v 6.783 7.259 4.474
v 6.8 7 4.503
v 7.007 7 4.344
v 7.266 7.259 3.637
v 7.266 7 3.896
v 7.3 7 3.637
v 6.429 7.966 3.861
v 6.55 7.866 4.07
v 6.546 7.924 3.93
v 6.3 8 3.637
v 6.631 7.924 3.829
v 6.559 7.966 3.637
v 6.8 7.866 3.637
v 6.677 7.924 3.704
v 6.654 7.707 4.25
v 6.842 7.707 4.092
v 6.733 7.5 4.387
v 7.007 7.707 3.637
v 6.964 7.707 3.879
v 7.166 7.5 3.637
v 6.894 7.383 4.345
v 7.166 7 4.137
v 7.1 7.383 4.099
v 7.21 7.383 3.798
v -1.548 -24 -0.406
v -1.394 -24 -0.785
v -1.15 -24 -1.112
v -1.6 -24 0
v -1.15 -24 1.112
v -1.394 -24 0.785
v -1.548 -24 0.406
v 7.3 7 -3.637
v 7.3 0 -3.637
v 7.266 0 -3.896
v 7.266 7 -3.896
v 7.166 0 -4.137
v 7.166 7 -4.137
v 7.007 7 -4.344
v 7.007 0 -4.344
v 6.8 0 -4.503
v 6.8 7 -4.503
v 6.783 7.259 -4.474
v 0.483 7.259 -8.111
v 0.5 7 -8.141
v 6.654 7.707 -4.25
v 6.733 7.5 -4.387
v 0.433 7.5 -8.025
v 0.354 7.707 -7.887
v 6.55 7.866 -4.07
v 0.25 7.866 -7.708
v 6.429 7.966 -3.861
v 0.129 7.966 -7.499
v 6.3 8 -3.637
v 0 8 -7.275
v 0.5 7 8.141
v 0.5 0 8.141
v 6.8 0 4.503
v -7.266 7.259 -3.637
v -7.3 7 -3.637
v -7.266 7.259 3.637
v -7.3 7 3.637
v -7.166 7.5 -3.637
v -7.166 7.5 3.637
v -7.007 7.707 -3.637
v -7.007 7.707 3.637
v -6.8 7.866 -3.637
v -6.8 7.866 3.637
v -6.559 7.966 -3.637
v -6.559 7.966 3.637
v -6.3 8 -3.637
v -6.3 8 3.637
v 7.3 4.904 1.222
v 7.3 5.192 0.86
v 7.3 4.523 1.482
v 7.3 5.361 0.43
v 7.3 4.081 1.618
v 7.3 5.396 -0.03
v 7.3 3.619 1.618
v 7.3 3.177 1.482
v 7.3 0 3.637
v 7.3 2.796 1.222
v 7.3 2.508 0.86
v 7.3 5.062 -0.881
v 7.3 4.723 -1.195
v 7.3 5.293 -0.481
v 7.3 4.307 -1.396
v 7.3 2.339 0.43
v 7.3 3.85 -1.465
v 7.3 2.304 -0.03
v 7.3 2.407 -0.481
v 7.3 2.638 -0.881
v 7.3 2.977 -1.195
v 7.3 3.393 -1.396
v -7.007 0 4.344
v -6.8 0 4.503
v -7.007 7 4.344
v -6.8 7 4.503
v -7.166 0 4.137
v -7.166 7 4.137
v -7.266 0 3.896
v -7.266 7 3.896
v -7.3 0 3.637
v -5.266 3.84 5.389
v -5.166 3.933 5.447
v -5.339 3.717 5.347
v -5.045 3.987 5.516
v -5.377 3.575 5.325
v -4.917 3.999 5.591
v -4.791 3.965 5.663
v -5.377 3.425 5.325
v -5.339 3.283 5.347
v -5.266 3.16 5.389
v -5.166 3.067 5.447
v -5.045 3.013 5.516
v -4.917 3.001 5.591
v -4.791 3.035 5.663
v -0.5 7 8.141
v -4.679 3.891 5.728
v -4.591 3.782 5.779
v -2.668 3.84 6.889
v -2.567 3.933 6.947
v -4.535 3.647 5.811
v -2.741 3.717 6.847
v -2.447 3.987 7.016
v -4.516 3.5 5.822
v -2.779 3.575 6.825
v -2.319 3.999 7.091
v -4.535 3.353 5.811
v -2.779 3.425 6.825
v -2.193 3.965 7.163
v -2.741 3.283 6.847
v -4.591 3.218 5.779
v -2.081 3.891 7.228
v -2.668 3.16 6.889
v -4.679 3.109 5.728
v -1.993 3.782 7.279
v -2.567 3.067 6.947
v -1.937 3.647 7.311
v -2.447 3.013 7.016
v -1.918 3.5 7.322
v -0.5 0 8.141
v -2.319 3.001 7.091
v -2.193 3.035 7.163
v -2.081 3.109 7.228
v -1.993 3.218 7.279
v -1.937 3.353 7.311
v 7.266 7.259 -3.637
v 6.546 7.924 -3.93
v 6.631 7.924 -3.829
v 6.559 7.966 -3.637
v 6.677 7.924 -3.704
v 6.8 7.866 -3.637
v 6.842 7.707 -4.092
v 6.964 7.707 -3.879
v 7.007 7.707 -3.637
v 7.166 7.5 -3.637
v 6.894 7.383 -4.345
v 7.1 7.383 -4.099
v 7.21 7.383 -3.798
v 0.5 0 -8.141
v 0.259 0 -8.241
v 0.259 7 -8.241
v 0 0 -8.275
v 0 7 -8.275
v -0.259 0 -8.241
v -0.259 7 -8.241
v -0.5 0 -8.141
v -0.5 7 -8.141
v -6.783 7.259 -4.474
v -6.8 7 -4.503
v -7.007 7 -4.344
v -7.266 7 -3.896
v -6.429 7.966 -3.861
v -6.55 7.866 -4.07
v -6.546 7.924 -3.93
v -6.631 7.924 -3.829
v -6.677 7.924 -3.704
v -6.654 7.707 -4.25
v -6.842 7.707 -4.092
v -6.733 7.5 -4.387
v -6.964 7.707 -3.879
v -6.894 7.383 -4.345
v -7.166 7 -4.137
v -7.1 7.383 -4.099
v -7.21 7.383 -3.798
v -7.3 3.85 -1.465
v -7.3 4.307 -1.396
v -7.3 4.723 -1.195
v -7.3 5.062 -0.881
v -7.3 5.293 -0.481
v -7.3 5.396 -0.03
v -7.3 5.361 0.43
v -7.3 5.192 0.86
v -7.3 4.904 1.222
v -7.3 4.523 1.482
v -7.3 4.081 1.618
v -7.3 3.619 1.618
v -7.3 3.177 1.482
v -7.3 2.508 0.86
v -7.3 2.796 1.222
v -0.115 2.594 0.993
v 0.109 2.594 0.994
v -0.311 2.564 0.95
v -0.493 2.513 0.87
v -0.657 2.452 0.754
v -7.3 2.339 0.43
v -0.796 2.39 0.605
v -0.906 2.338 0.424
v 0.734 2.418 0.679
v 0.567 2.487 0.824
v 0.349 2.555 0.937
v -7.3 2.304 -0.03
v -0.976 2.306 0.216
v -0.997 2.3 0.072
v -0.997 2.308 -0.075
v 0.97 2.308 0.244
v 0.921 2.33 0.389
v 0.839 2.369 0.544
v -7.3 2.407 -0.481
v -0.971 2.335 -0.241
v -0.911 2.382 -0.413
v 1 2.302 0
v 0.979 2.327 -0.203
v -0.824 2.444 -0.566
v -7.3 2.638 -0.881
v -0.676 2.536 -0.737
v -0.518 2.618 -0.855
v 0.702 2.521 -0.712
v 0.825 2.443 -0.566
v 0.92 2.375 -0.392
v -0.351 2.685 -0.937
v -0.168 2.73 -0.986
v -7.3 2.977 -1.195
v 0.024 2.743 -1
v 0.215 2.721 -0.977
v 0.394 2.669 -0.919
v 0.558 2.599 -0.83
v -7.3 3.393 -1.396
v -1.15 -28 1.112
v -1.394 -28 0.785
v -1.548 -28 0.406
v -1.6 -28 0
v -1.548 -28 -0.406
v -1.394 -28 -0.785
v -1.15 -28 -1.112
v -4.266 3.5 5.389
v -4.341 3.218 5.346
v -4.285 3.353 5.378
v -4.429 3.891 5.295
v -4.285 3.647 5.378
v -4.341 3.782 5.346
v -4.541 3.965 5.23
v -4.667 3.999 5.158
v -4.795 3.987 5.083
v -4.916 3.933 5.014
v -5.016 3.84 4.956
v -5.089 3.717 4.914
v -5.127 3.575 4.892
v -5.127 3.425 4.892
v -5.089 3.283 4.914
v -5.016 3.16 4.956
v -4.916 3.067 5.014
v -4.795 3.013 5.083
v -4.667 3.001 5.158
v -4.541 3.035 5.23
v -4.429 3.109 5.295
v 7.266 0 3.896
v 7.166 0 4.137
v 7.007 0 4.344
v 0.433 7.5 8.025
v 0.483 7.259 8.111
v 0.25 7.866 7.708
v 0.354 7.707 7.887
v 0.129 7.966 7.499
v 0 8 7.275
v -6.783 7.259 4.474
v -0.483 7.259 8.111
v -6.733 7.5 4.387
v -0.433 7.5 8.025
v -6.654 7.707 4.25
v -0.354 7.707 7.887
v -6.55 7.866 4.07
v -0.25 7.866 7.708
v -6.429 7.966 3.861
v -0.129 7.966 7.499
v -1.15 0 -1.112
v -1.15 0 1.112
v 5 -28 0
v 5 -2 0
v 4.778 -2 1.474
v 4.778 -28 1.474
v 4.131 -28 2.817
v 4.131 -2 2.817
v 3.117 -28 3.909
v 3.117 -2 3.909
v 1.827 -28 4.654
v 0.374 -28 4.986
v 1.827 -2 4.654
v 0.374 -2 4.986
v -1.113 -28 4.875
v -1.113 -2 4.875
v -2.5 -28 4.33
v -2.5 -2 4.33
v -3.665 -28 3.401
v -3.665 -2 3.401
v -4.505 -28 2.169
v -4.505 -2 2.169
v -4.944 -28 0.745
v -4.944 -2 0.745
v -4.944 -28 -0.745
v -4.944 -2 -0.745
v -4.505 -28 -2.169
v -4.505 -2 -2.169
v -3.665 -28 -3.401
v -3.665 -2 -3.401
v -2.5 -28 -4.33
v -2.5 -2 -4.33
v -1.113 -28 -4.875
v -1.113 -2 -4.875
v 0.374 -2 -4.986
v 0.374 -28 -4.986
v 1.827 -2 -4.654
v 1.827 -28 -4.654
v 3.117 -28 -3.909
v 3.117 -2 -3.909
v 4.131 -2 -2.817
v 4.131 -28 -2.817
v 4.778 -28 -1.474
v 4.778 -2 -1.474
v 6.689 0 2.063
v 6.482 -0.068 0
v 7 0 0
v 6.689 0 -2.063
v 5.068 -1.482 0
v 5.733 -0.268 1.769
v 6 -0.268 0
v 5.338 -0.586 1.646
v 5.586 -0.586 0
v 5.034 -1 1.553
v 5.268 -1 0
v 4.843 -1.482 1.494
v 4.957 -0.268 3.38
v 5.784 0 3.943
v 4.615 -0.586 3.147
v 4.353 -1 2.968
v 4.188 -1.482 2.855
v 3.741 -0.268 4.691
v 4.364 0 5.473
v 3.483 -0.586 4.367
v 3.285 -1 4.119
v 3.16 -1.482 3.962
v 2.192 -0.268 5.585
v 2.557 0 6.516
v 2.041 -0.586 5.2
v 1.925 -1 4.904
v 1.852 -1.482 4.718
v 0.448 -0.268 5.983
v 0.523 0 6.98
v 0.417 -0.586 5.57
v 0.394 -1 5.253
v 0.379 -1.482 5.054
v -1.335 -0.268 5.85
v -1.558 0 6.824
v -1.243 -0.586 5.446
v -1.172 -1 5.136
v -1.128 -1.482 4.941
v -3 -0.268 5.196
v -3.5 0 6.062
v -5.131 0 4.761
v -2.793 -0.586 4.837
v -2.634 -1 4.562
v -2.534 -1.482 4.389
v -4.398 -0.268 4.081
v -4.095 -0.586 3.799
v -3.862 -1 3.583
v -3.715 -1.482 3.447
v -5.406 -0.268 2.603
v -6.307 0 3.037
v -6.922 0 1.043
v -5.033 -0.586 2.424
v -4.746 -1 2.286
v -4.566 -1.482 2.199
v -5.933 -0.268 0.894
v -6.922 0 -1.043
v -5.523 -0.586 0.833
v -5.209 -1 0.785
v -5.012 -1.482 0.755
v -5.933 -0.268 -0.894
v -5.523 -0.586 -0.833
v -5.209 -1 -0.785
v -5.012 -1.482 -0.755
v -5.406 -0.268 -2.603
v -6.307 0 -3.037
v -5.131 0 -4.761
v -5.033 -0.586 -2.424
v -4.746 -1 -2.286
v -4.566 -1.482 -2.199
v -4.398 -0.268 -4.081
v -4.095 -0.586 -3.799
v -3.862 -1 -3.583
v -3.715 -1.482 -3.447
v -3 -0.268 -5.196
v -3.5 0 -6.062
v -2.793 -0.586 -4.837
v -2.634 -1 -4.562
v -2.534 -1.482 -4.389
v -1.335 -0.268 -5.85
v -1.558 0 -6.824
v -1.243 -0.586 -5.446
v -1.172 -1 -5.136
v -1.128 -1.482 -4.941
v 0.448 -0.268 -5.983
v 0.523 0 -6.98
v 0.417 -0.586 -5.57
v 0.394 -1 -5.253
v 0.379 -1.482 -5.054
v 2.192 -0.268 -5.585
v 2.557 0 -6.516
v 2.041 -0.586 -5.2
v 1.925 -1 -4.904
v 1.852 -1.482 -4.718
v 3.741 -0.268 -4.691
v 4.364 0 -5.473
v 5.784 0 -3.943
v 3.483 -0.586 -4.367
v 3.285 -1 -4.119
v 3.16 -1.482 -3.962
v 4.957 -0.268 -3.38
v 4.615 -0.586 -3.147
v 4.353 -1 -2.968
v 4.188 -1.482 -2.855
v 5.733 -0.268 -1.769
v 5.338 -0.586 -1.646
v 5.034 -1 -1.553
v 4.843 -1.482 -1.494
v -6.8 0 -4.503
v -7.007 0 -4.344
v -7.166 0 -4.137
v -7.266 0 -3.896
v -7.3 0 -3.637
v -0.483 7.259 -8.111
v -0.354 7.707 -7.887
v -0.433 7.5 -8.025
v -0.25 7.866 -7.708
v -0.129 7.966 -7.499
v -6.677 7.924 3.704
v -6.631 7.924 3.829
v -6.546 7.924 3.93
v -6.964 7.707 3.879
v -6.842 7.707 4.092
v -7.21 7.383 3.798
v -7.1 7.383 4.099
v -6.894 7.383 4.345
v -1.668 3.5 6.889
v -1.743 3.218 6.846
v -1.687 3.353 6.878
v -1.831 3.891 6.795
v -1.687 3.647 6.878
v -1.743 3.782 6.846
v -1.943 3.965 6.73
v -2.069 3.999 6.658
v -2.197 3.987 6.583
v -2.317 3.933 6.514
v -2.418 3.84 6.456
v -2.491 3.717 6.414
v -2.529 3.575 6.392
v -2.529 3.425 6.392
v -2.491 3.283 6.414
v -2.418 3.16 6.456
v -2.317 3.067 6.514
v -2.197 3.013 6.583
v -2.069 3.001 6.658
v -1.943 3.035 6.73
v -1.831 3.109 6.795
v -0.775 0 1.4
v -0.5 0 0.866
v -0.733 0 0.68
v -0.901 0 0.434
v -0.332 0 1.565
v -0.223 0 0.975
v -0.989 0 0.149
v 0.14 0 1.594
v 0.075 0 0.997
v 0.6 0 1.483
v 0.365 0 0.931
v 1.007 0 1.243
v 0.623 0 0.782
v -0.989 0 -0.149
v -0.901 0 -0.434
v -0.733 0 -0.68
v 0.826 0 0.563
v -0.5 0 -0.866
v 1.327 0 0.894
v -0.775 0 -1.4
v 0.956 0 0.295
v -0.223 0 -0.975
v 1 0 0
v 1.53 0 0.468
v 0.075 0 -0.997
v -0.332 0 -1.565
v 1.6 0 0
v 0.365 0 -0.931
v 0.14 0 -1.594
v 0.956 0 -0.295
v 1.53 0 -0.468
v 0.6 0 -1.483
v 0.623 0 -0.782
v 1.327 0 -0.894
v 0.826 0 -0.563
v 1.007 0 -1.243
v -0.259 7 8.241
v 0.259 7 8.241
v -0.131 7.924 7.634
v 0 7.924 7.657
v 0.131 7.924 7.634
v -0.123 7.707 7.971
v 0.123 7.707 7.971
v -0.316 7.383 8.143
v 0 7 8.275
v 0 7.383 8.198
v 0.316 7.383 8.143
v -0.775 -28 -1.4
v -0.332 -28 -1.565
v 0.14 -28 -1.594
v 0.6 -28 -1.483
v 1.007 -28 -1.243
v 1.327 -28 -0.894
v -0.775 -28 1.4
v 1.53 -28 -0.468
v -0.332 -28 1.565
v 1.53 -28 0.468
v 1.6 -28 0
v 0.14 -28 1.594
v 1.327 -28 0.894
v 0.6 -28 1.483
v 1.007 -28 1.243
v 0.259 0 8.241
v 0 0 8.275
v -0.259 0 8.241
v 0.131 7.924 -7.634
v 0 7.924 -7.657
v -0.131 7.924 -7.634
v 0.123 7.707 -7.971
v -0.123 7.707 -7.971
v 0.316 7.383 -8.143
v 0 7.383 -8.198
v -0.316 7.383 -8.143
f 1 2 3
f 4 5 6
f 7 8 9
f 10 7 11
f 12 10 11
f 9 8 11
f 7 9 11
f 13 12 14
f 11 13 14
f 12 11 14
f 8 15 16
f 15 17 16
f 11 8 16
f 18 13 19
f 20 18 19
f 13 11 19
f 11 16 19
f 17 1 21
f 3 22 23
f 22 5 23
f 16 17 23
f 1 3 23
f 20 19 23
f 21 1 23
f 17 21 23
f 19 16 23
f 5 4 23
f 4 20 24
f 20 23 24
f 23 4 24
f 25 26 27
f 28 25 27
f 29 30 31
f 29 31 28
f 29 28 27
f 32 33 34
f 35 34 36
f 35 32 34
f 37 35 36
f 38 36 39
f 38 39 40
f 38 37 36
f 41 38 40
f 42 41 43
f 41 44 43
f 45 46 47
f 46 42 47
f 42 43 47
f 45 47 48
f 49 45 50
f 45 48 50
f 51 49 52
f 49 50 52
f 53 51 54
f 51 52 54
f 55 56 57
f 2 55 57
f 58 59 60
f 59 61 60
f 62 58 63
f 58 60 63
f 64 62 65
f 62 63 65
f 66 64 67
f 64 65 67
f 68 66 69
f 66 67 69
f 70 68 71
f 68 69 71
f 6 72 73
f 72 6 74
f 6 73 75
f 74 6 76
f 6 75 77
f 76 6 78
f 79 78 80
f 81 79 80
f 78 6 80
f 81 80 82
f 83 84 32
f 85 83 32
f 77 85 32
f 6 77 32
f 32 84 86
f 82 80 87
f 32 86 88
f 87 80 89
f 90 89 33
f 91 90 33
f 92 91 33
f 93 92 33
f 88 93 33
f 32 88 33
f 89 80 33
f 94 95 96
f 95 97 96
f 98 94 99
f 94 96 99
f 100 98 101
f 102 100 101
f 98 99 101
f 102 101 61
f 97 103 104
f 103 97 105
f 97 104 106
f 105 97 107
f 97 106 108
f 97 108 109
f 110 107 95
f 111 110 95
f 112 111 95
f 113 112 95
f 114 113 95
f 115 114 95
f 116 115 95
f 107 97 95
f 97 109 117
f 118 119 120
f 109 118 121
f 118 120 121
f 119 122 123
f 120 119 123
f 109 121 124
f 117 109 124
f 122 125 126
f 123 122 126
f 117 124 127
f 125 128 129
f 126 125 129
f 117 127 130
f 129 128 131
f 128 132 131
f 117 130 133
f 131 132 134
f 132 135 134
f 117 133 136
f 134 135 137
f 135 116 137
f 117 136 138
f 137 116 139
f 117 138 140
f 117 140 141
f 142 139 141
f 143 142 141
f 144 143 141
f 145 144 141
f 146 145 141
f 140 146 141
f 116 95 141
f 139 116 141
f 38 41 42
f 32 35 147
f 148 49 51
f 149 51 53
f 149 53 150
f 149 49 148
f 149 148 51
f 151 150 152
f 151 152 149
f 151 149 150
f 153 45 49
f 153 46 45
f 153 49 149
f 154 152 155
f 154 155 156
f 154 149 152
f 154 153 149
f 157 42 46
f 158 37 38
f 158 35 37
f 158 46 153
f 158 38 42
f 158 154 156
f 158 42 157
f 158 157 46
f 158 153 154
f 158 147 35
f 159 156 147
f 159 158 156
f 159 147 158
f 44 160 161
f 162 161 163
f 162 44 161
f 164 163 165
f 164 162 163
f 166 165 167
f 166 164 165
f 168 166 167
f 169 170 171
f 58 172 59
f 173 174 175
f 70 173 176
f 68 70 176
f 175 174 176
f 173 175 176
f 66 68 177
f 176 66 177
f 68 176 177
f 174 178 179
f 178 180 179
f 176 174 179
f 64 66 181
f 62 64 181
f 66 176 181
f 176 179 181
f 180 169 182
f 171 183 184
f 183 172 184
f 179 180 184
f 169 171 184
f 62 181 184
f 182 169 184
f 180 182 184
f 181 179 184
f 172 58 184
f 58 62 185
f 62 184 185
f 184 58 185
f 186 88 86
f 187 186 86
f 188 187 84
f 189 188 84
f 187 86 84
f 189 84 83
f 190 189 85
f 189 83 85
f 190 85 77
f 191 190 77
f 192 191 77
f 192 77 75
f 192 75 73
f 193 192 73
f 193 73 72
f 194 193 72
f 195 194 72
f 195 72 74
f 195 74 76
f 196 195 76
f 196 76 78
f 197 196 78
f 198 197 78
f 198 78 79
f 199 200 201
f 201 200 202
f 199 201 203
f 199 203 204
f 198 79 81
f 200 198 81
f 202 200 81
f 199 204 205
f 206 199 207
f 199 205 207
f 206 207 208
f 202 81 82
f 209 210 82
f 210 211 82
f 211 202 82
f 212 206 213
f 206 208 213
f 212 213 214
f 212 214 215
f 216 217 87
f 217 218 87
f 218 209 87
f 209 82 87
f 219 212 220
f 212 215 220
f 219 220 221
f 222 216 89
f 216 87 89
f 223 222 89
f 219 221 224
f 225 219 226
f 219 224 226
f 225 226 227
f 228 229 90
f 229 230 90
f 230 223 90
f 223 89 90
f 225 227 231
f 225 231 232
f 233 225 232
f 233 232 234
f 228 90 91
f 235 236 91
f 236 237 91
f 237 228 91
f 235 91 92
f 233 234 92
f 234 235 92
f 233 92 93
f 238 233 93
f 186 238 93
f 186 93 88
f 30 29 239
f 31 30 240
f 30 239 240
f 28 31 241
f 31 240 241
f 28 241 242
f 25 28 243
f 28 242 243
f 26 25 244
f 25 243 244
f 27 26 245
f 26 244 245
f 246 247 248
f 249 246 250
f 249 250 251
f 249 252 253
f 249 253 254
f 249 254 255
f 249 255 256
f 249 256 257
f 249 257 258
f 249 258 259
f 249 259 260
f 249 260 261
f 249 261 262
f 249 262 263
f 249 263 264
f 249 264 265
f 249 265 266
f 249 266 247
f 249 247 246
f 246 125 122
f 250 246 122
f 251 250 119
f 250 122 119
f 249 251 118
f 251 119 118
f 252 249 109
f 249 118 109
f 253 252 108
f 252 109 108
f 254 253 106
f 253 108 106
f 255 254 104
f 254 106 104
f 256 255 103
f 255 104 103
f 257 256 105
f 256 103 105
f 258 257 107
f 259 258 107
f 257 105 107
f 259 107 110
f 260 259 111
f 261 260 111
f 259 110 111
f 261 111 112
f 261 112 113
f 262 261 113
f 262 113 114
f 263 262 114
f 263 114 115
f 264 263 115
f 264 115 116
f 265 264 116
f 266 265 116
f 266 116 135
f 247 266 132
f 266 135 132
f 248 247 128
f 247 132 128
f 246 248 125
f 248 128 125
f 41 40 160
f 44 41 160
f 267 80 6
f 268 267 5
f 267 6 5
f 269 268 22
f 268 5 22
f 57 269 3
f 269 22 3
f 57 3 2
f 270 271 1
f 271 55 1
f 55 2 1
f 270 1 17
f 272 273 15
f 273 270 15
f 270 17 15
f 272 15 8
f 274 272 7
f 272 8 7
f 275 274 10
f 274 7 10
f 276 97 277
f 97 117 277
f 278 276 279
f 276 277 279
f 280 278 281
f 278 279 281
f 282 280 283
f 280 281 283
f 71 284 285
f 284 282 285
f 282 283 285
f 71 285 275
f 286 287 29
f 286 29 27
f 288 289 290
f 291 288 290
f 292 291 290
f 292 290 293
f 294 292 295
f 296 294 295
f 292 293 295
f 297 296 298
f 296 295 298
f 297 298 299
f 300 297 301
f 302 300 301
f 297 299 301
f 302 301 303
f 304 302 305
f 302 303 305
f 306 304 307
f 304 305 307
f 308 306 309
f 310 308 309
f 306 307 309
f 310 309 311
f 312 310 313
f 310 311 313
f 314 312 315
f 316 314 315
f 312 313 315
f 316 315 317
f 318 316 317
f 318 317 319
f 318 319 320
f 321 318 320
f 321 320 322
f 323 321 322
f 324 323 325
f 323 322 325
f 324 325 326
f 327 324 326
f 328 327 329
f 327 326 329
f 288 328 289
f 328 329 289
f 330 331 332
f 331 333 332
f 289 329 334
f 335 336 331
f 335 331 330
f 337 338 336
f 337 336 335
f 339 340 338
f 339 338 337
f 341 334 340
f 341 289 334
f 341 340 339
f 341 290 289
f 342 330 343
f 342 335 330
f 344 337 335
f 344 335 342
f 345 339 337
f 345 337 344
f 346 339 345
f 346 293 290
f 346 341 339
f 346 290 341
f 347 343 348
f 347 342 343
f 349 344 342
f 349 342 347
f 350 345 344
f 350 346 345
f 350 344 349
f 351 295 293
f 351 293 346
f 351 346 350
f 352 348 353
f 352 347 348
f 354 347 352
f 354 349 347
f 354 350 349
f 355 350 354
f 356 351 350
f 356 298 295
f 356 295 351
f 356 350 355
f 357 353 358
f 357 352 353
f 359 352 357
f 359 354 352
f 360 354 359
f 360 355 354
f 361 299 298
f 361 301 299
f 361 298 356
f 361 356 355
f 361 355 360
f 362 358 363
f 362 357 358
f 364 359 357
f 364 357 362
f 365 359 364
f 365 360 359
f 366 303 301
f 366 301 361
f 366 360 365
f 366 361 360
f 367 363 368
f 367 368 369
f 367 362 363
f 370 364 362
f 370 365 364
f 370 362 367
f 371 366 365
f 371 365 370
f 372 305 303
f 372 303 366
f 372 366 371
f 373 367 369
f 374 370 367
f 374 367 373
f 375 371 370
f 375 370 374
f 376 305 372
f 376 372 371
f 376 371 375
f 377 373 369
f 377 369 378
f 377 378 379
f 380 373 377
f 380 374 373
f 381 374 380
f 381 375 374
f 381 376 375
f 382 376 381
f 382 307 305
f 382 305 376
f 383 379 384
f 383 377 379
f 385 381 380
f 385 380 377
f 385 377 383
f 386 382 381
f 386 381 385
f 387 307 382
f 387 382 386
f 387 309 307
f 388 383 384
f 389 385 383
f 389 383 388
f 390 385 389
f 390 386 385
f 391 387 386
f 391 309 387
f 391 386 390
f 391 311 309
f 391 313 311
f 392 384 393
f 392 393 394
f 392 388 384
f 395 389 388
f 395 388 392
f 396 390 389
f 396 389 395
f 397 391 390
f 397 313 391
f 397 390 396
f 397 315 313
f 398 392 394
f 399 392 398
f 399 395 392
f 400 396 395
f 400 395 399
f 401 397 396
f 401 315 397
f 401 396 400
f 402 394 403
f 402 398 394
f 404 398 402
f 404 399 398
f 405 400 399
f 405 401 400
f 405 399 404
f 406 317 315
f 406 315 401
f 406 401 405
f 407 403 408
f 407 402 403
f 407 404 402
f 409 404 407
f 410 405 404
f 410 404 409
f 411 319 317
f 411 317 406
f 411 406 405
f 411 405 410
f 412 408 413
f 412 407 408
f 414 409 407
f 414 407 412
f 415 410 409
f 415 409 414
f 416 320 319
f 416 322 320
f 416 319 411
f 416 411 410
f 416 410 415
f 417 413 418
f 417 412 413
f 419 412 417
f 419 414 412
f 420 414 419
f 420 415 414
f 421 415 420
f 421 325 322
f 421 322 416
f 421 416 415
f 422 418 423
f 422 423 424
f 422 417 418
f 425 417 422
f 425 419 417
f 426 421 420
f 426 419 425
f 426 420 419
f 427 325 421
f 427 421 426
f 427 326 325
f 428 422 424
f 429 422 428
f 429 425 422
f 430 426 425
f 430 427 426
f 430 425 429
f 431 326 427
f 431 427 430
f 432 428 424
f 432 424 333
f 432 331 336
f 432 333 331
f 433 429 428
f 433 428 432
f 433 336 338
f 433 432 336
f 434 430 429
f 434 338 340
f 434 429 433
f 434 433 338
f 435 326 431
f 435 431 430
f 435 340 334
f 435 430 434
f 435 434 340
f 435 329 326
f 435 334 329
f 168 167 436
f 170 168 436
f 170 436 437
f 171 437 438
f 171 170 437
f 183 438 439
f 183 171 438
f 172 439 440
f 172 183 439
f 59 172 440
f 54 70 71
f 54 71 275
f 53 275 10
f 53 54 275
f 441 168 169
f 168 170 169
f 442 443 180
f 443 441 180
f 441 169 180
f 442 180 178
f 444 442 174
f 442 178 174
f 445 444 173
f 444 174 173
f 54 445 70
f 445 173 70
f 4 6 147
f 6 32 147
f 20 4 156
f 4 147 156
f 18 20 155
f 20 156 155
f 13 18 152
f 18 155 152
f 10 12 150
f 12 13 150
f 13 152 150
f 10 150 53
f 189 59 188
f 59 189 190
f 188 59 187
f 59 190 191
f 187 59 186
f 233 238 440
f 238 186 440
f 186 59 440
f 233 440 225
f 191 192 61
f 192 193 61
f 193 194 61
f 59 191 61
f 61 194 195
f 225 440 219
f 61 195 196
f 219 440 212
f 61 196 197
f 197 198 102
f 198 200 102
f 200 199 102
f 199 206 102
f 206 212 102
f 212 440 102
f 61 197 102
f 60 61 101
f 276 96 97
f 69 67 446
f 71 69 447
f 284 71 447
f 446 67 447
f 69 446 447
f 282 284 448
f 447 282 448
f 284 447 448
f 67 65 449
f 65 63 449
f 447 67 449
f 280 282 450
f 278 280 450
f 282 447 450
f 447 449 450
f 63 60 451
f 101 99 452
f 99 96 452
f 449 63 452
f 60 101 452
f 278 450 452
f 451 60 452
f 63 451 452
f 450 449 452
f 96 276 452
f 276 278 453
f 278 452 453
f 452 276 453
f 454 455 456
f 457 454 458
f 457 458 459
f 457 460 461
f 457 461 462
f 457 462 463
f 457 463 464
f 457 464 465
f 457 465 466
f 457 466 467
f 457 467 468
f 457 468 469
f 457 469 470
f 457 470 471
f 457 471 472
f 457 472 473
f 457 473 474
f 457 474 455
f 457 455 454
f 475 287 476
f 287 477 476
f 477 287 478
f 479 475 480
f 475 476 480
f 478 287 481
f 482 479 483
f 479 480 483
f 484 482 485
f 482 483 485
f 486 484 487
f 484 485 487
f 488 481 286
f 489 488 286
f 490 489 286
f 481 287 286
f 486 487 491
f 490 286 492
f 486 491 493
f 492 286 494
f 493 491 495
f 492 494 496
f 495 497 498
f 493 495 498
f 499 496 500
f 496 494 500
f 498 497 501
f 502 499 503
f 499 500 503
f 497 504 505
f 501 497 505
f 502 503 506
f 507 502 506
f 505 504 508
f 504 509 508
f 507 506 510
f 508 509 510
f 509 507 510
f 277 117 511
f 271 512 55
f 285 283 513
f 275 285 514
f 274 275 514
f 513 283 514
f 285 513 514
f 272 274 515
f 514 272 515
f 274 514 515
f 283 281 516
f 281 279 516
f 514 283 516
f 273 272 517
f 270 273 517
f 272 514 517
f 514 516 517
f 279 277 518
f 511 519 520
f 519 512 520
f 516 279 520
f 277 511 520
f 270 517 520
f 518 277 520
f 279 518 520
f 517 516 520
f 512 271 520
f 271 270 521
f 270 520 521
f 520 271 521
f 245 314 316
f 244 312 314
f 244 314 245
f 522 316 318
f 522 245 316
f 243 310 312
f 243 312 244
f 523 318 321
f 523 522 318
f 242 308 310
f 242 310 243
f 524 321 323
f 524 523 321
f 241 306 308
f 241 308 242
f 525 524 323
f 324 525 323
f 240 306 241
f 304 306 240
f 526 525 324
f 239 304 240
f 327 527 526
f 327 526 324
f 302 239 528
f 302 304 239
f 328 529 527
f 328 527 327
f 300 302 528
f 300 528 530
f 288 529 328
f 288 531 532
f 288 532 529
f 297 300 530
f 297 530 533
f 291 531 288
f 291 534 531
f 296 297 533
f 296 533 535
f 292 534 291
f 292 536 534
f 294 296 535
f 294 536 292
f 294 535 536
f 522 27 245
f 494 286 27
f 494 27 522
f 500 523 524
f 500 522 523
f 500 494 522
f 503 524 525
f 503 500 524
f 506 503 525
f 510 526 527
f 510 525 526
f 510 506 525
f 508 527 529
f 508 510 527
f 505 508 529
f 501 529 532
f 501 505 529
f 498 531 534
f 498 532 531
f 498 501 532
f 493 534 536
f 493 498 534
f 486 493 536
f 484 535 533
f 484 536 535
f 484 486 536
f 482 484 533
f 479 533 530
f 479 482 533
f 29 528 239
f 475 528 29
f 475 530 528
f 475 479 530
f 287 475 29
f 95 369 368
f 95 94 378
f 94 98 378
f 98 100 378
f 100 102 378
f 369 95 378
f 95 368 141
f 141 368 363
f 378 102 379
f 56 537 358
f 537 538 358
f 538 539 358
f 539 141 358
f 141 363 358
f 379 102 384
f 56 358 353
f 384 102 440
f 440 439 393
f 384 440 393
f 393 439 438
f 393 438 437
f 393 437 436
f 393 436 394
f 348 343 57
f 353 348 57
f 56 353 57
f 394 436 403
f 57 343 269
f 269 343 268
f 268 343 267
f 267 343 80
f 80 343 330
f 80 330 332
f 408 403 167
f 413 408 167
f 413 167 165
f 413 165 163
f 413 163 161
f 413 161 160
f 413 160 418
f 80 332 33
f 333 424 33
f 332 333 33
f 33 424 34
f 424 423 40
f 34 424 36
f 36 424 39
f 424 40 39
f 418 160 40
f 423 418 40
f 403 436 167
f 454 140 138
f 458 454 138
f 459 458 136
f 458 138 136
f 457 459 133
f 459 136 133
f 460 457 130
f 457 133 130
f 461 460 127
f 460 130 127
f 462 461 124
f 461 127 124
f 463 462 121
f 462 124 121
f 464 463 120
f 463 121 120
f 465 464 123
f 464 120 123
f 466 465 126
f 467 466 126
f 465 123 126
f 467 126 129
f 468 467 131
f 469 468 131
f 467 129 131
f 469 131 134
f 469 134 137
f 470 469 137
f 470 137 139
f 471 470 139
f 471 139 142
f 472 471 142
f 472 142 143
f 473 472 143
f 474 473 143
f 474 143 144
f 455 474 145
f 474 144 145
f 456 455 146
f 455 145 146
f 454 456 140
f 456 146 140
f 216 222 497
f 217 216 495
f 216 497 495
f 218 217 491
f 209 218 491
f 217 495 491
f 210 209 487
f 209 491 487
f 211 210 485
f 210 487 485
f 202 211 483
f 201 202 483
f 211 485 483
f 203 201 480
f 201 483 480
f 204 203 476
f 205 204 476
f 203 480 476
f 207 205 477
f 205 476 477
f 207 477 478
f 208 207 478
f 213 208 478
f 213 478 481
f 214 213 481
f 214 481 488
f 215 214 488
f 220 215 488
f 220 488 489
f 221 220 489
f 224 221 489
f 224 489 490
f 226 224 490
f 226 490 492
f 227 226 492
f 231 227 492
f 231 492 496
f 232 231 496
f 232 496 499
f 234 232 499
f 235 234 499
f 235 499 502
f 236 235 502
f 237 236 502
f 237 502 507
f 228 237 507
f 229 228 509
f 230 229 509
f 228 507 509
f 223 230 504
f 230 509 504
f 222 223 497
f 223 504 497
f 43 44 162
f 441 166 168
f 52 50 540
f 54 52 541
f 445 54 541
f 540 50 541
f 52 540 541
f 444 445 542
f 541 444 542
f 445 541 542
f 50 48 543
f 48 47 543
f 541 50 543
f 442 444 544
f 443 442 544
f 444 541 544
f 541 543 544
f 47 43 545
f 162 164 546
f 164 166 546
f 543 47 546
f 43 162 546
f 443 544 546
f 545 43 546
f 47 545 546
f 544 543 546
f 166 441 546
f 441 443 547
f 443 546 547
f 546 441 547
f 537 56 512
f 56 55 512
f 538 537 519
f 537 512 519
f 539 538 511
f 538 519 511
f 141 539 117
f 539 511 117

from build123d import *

# Parameters (mm, degrees)
BOSS_EXTRUDE1_DEPTH     = 8
SKETCH2_R               = 5
BOSS_EXTRUDE2_DEPTH     = 28
FILLET1_R               = 2
SKETCH3_R               = 1.55
CUT_EXTRUDE1_DEPTH      = 33.683533061
FILLET2_R               = 1
CUT_EXTRUDE3_START      = -4
SKETCH5_R               = 1.6
CUT_EXTRUDE3_DEPTH      = 4
SKETCH6_R               = 0.5
CUT_EXTRUDE4_DEPTH      = 0.5
CUT_EXTRUDE5_REACH      = 32.096
CUT_EXTRUDE5_END_RADIUS = 1.55
SKETCH7_R               = 1


with BuildPart() as part:
    # Sketch1 → Boss-Extrude1 (new body)
    with BuildSketch(Plane(origin=(0, 0, 0), x_dir=(1, 0, 0), z_dir=(0, 1, 0))):
        Polygon((7.3, -4.214656965), (7.3, 4.214656965), (0, 8.42931393), (-7.3, 4.214656965), (-7.3, -4.214656965), (0, -8.42931393), align=None)
    extrude(amount=BOSS_EXTRUDE1_DEPTH)

    # Sketch2 → Boss-Extrude2 (add)
    with BuildSketch(Plane.XZ):
        Circle(SKETCH2_R)
        with BuildLine():
            Line((-1.15, 1.112429773), (-1.15, -1.112429773))
            ThreePointArc((-1.15, -1.112429773), (1.6, 0), (-1.15, 1.112429773))
        make_face(mode=Mode.SUBTRACT)
    extrude(amount=BOSS_EXTRUDE2_DEPTH)

    # Fillet1
    fillet1_edges = [part.edges().sort_by_distance(p)[0] for p in [
        (-5, 0, 0),
    ]]
    fillet(fillet1_edges, radius=FILLET1_R)

    # Sketch3 → Cut-Extrude1 (cut, through all)
    with BuildSketch(Plane(origin=(7.3, 0, 0), x_dir=(0, 0, -1), z_dir=(1, 0, 0))):
        with Locations((-0.085343035, 3.85)):
            Circle(SKETCH3_R)
    extrude(amount=-CUT_EXTRUDE1_DEPTH, mode=Mode.SUBTRACT)

    # Fillet2
    fillet2_edges = [part.edges().sort_by_distance(p)[0] for p in [
        (-3.65, 8, 6.321985448),
        (-7.3, 8, 0),
        (-3.65, 8, -6.321985448),
        (3.65, 8, -6.321985448),
        (7.3, 8, 0),
        (3.65, 8, 6.321985448),
        (-7.3, 4, -4.214656965),
        (0, 4, -8.42931393),
        (7.3, 4, -4.214656965),
        (7.3, 4, 4.214656965),
        (0, 4, 8.42931393),
        (-7.3, 4, 4.214656965),
    ]]
    fillet(fillet2_edges, radius=FILLET2_R)

    # Sketch5 → Cut-Extrude3 (cut)
    with BuildSketch(Plane.XZ.offset(28).offset(CUT_EXTRUDE3_START)):
        Circle(SKETCH5_R)
    extrude(amount=CUT_EXTRUDE3_DEPTH, mode=Mode.SUBTRACT)

    # Sketch6 → Cut-Extrude4 (cut)
    with BuildSketch(Plane(origin=(-3.65, 0, 6.321985448), x_dir=(0.8660254037844386, 0, 0.5000000000000001), z_dir=(-0.5000000000000001, 0, 0.8660254037844386))):
        with Locations((-1.5, 3.5)):
            Circle(SKETCH6_R)
        with Locations((1.5, 3.5)):
            Circle(SKETCH6_R)
    extrude(amount=-CUT_EXTRUDE4_DEPTH, mode=Mode.SUBTRACT)

    # Cut-Extrude5: up to this cylinder (the profile starts outside it)
    cut_extrude5_end = Plane(origin=(0, 3.85, 0.085343035), z_dir=(1, 0, 0)) * Cylinder(CUT_EXTRUDE5_END_RADIUS, 68.292, mode=Mode.PRIVATE)
    # Sketch7 → Cut-Extrude5 (cut, up to the surface)
    with BuildSketch(Plane.XZ, mode=Mode.PRIVATE) as cut_extrude5_sk1:
        Circle(SKETCH7_R)
    cut_extrude5_tool1 = extrude(cut_extrude5_sk1.sketch, amount=-CUT_EXTRUDE5_REACH, mode=Mode.PRIVATE) - cut_extrude5_end
    add(cut_extrude5_tool1.solids().sort_by_distance((0, 0, 0))[0], mode=Mode.SUBTRACT)


solid = part.part
